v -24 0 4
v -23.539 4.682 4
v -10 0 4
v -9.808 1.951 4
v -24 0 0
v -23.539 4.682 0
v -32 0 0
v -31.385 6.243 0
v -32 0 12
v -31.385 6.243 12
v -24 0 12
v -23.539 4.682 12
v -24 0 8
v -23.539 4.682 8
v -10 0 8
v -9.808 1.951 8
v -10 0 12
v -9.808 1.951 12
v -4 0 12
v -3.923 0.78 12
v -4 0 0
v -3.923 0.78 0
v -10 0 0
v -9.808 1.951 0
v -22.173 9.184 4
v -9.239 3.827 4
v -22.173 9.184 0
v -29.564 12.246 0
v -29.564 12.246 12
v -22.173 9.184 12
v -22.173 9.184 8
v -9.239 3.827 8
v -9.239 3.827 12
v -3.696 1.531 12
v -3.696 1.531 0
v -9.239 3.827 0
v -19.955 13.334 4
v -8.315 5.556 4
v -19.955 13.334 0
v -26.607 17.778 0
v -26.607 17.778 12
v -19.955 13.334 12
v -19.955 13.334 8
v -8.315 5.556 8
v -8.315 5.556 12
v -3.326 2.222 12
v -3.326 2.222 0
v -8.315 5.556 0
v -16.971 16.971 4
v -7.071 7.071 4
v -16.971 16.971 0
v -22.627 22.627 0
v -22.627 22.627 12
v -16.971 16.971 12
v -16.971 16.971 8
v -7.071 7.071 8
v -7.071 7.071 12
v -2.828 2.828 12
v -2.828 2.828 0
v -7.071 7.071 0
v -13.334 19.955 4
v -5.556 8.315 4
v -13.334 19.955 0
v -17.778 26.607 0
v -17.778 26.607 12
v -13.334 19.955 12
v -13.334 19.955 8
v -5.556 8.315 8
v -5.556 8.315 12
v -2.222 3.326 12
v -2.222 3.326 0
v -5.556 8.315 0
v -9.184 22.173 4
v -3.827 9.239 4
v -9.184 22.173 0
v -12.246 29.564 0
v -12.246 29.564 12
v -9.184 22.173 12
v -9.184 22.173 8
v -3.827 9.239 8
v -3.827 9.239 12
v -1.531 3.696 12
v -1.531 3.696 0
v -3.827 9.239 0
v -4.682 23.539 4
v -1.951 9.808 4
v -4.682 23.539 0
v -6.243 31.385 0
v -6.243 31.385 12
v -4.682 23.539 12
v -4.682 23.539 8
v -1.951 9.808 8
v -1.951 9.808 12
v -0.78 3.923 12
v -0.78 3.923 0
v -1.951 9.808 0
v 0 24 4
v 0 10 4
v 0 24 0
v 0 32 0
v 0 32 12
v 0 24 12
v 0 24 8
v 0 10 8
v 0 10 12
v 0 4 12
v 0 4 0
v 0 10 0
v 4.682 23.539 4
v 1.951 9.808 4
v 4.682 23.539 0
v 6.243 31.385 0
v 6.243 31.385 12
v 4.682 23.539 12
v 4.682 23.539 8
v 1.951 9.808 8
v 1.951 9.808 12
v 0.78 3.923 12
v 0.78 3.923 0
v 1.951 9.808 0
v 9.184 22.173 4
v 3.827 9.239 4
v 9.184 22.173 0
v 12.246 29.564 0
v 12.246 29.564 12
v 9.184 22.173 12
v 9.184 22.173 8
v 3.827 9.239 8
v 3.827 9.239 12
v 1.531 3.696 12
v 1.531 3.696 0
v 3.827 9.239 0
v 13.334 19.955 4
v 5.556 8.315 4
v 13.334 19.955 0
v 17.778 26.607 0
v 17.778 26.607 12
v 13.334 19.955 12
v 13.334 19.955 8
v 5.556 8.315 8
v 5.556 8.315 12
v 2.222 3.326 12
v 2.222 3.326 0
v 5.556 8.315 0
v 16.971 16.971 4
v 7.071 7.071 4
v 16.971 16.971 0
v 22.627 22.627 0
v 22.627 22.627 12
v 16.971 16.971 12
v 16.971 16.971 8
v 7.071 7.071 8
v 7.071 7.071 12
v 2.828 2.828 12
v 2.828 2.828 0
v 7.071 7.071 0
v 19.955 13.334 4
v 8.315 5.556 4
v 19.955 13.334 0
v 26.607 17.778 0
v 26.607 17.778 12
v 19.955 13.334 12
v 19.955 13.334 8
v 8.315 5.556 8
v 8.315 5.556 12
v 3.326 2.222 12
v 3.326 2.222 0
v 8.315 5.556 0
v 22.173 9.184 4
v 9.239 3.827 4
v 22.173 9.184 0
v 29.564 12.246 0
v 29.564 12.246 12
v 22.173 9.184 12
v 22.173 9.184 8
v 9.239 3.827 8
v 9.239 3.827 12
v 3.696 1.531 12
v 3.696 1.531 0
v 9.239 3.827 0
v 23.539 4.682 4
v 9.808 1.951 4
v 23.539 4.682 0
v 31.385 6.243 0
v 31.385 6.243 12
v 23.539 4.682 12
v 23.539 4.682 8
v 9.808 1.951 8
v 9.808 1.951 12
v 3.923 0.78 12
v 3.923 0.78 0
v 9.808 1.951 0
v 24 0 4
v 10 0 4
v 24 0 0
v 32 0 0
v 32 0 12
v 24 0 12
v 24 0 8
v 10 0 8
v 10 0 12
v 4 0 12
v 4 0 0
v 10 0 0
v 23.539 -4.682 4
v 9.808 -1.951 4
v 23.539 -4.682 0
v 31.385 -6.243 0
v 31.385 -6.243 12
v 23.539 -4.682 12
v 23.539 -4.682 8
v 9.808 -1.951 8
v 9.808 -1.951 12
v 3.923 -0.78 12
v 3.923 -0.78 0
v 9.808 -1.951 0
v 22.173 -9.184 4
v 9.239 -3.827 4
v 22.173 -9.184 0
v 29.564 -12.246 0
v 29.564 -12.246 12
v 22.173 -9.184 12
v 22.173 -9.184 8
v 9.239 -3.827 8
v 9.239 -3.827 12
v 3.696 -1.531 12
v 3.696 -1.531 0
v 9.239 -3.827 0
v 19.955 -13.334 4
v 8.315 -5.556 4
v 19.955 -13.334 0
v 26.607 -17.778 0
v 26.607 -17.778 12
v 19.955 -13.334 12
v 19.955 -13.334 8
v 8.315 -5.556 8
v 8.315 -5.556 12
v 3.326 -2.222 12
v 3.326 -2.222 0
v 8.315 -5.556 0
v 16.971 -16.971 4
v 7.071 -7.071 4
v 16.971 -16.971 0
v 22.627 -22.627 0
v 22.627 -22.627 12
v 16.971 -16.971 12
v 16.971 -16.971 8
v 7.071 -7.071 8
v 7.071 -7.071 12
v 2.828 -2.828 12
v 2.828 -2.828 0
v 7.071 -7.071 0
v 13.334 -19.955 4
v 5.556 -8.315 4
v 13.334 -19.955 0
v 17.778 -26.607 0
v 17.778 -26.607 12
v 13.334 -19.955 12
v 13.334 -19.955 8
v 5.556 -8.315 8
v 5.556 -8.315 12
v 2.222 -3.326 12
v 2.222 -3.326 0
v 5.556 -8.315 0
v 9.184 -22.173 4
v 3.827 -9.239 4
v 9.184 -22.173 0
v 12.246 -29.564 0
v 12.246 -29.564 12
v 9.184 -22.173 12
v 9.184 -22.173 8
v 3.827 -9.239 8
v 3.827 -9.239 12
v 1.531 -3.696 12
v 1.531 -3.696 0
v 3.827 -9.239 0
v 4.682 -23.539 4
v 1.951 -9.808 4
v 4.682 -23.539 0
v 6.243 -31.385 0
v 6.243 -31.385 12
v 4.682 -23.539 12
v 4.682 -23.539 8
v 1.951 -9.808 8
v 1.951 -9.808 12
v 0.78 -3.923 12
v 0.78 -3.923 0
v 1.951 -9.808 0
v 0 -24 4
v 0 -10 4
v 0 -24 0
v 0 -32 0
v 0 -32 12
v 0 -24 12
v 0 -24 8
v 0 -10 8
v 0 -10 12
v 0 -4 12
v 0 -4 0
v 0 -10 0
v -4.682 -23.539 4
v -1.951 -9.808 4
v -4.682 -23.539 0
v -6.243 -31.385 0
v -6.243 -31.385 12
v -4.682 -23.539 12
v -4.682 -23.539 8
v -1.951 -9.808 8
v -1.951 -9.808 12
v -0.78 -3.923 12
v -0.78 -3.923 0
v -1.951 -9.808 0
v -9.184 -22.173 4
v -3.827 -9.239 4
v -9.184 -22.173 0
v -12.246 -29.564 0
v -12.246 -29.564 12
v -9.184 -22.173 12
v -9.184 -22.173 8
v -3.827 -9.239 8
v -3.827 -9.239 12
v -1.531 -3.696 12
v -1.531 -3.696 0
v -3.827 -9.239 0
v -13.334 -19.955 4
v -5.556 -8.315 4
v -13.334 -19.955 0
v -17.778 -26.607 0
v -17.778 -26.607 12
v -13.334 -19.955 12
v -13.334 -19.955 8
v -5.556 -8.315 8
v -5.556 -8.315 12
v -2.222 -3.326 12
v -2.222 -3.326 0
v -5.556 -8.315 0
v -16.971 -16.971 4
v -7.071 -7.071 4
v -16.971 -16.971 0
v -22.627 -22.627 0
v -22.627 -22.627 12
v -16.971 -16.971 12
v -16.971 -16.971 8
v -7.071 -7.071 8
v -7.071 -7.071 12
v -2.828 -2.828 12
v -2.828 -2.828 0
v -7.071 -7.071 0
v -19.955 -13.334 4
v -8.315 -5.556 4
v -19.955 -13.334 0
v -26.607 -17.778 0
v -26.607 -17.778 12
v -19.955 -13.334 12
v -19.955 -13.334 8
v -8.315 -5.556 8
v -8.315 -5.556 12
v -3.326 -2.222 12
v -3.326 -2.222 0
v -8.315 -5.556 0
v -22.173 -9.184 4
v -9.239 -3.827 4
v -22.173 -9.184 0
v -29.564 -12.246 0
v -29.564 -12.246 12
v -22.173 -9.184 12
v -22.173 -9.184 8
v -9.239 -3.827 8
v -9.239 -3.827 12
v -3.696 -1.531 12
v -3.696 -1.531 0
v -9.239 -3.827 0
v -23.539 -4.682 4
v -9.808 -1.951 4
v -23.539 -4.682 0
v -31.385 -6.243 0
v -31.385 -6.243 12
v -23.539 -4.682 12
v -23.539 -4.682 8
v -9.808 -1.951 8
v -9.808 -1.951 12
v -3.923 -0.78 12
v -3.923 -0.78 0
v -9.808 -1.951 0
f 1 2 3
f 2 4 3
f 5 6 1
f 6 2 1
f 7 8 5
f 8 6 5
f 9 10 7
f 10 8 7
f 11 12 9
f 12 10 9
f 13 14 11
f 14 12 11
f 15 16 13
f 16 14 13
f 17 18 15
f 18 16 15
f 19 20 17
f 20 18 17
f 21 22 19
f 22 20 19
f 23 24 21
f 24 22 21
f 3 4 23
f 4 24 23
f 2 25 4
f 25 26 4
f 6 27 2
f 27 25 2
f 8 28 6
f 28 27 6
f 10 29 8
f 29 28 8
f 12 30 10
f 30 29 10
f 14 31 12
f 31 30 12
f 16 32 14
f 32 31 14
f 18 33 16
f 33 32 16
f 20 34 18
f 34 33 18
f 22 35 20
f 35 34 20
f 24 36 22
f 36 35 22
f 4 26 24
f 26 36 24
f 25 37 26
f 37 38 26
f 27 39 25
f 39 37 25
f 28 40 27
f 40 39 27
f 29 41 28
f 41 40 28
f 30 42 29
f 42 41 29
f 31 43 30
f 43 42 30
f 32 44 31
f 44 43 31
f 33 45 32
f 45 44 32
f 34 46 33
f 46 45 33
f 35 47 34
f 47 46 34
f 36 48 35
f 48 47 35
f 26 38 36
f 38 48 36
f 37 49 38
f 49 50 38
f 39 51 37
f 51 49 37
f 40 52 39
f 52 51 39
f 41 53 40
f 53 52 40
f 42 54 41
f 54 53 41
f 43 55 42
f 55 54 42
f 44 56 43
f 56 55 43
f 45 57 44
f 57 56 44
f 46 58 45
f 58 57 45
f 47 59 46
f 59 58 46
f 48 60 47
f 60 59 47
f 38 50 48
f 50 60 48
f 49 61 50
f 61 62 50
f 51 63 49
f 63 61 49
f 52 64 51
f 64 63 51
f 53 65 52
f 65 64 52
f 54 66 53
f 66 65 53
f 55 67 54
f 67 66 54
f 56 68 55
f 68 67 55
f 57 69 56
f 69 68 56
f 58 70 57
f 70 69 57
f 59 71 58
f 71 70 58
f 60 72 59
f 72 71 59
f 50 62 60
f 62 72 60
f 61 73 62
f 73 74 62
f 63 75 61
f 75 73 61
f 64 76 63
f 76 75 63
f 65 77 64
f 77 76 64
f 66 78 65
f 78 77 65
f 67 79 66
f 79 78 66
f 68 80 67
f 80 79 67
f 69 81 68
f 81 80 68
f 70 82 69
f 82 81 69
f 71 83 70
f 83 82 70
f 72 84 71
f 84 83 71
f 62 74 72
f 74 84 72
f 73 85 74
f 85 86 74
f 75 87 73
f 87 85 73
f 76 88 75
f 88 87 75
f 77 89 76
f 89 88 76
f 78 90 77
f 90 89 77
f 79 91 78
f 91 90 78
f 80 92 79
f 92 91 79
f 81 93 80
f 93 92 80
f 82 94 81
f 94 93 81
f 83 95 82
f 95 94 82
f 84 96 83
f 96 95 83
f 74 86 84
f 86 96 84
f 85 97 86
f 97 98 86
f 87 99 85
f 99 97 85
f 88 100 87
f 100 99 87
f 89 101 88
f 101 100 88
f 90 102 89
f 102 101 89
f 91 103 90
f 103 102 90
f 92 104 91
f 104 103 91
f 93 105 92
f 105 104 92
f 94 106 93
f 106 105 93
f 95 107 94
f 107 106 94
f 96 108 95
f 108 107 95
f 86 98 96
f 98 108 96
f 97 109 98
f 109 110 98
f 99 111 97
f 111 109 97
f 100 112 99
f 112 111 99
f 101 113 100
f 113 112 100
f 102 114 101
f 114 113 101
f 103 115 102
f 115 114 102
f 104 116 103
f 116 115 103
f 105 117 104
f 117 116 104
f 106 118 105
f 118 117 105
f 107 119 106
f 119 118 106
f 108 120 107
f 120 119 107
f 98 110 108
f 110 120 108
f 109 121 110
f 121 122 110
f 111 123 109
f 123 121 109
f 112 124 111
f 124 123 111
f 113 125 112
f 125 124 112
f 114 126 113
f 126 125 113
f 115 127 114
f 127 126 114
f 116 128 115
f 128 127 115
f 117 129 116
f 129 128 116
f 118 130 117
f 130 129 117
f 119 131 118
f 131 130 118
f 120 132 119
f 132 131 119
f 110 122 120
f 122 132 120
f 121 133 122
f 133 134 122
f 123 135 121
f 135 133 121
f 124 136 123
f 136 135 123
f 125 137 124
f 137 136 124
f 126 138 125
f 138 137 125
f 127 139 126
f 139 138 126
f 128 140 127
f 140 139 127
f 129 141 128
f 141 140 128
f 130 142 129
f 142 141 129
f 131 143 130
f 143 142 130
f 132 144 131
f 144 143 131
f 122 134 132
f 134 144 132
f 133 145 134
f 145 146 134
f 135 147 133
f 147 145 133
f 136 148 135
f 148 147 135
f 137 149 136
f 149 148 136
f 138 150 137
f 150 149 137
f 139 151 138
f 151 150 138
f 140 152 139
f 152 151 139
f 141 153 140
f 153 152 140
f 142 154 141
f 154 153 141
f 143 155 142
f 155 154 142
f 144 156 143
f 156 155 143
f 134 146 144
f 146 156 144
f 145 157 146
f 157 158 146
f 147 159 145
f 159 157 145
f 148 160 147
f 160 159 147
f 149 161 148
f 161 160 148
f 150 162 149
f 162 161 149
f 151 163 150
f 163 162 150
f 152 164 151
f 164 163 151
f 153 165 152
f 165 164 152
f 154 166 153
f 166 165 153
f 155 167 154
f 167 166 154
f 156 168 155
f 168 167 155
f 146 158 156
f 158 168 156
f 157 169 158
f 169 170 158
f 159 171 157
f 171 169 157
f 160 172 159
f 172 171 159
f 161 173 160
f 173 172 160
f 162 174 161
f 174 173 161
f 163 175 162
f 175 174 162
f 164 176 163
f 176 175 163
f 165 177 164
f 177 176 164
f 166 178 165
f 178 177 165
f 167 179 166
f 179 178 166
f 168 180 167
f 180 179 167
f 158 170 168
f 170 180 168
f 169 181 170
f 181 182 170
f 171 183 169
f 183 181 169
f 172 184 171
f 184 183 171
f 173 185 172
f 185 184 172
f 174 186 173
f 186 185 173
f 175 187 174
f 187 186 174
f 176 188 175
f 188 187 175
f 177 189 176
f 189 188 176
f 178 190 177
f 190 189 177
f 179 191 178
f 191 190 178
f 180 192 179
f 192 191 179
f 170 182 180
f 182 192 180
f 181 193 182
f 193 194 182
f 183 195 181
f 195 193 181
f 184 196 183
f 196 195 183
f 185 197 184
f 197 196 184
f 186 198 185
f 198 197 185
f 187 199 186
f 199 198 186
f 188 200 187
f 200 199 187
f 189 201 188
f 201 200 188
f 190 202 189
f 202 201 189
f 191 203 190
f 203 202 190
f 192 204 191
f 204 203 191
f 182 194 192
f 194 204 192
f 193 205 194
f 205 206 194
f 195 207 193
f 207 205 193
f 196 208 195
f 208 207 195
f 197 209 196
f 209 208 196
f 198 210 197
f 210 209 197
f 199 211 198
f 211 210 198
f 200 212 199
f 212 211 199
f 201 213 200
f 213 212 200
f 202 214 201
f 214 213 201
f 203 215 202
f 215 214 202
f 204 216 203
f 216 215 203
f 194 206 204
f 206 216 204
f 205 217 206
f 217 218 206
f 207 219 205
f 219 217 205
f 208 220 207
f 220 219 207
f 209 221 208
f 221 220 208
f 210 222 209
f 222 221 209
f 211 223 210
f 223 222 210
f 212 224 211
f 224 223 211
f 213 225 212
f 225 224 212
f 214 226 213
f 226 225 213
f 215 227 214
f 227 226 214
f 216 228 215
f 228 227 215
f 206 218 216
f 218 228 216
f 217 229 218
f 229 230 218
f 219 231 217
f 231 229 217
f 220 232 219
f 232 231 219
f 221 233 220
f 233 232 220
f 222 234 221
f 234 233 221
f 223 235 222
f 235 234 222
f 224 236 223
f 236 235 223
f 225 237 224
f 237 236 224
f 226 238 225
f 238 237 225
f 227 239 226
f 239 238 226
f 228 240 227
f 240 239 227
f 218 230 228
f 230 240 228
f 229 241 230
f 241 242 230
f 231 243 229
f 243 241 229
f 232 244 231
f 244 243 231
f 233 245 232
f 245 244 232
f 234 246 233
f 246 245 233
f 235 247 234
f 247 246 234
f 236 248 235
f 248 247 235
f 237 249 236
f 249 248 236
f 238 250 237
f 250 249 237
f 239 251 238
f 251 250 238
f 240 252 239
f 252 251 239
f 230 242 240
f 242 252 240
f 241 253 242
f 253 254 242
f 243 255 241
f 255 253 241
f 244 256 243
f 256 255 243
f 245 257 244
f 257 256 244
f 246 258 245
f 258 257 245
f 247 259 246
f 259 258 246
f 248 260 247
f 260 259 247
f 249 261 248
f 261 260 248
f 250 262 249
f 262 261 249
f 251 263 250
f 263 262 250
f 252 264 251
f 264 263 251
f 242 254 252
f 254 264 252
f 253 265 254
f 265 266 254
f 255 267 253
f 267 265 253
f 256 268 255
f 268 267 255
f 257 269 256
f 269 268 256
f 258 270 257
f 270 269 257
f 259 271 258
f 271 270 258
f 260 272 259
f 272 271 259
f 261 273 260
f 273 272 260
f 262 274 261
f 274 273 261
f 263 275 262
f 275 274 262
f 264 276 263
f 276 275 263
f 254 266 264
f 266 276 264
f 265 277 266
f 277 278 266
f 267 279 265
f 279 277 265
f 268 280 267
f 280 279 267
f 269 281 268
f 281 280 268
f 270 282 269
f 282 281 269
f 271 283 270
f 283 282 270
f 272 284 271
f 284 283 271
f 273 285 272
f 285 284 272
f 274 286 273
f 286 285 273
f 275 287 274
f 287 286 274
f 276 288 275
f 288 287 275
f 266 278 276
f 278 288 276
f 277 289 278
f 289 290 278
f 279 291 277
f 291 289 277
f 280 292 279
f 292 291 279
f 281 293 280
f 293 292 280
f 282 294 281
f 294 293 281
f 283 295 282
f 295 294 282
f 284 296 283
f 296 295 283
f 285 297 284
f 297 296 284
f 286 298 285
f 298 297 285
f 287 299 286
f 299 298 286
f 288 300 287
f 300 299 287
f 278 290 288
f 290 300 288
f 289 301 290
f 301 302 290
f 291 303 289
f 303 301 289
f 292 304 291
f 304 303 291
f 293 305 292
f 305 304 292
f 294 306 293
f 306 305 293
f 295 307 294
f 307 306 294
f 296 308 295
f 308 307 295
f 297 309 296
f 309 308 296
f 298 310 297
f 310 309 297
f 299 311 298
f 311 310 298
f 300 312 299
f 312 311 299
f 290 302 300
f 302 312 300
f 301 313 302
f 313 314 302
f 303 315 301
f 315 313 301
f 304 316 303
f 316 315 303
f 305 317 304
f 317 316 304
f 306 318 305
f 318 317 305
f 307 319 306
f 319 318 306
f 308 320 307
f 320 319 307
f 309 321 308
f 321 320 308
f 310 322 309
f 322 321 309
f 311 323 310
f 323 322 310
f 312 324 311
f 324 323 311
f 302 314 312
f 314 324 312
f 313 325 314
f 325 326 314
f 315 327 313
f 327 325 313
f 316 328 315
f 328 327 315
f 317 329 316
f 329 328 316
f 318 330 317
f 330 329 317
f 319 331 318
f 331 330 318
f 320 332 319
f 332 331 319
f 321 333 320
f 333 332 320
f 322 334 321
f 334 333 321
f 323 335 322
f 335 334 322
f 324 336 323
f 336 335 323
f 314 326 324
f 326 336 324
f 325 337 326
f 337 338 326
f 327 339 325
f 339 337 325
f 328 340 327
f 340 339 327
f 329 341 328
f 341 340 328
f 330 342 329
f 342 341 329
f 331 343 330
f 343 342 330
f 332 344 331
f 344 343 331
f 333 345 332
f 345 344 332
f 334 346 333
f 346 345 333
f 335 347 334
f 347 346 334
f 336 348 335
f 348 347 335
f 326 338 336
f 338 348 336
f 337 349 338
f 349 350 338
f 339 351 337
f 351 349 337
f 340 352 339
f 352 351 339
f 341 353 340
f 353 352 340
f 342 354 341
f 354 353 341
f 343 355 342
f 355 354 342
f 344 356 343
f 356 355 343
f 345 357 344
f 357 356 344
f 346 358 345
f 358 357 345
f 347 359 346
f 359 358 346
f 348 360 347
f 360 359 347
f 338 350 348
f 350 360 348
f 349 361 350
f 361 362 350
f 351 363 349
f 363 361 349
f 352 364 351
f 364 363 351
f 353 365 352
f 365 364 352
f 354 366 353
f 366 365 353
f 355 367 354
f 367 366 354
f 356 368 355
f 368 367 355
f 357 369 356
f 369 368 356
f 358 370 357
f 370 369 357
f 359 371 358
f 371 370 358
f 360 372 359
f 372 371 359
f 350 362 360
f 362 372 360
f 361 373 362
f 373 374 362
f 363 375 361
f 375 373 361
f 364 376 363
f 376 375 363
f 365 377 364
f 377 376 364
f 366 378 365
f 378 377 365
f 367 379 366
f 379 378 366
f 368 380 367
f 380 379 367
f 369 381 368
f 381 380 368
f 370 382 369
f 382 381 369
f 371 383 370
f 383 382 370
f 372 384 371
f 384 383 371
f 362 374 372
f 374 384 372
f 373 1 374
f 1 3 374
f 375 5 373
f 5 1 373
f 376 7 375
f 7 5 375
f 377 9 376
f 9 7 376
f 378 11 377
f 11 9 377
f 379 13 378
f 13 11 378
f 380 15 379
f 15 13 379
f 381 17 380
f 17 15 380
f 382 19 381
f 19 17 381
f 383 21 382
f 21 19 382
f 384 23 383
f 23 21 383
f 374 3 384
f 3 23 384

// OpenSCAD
$fn = 32;

// ----------------------------------------------------------------------
// Revolved part: handwheel R32
// ----------------------------------------------------------------------

// --- parameters (mm) ---
bore_r = 4;               // bore radius
rim_r = 32;               // rim radius
rim_w = 8;                // rim axial width
rim_t = 12;               // rim diameter height
hub_r = 10;               // hub radius
web_t = 4;                // web thickness
revolve_angle = 360;      // revolve sweep, degrees

bore_d = 2 * bore_r;
rim_d = 2 * rim_r;
hub_d = 2 * hub_r;

profile = [[4, 0], [10, 0], [10, 4], [24, 4], [24, 0], [32, 0], [32, 12], [24, 12], [24, 8], [10, 8], [10, 12], [4, 12]];  // primary outline, 12 points, counter clockwise

// --- the one profile operation ---
rotate_extrude(angle = revolve_angle) polygon(points = profile);
